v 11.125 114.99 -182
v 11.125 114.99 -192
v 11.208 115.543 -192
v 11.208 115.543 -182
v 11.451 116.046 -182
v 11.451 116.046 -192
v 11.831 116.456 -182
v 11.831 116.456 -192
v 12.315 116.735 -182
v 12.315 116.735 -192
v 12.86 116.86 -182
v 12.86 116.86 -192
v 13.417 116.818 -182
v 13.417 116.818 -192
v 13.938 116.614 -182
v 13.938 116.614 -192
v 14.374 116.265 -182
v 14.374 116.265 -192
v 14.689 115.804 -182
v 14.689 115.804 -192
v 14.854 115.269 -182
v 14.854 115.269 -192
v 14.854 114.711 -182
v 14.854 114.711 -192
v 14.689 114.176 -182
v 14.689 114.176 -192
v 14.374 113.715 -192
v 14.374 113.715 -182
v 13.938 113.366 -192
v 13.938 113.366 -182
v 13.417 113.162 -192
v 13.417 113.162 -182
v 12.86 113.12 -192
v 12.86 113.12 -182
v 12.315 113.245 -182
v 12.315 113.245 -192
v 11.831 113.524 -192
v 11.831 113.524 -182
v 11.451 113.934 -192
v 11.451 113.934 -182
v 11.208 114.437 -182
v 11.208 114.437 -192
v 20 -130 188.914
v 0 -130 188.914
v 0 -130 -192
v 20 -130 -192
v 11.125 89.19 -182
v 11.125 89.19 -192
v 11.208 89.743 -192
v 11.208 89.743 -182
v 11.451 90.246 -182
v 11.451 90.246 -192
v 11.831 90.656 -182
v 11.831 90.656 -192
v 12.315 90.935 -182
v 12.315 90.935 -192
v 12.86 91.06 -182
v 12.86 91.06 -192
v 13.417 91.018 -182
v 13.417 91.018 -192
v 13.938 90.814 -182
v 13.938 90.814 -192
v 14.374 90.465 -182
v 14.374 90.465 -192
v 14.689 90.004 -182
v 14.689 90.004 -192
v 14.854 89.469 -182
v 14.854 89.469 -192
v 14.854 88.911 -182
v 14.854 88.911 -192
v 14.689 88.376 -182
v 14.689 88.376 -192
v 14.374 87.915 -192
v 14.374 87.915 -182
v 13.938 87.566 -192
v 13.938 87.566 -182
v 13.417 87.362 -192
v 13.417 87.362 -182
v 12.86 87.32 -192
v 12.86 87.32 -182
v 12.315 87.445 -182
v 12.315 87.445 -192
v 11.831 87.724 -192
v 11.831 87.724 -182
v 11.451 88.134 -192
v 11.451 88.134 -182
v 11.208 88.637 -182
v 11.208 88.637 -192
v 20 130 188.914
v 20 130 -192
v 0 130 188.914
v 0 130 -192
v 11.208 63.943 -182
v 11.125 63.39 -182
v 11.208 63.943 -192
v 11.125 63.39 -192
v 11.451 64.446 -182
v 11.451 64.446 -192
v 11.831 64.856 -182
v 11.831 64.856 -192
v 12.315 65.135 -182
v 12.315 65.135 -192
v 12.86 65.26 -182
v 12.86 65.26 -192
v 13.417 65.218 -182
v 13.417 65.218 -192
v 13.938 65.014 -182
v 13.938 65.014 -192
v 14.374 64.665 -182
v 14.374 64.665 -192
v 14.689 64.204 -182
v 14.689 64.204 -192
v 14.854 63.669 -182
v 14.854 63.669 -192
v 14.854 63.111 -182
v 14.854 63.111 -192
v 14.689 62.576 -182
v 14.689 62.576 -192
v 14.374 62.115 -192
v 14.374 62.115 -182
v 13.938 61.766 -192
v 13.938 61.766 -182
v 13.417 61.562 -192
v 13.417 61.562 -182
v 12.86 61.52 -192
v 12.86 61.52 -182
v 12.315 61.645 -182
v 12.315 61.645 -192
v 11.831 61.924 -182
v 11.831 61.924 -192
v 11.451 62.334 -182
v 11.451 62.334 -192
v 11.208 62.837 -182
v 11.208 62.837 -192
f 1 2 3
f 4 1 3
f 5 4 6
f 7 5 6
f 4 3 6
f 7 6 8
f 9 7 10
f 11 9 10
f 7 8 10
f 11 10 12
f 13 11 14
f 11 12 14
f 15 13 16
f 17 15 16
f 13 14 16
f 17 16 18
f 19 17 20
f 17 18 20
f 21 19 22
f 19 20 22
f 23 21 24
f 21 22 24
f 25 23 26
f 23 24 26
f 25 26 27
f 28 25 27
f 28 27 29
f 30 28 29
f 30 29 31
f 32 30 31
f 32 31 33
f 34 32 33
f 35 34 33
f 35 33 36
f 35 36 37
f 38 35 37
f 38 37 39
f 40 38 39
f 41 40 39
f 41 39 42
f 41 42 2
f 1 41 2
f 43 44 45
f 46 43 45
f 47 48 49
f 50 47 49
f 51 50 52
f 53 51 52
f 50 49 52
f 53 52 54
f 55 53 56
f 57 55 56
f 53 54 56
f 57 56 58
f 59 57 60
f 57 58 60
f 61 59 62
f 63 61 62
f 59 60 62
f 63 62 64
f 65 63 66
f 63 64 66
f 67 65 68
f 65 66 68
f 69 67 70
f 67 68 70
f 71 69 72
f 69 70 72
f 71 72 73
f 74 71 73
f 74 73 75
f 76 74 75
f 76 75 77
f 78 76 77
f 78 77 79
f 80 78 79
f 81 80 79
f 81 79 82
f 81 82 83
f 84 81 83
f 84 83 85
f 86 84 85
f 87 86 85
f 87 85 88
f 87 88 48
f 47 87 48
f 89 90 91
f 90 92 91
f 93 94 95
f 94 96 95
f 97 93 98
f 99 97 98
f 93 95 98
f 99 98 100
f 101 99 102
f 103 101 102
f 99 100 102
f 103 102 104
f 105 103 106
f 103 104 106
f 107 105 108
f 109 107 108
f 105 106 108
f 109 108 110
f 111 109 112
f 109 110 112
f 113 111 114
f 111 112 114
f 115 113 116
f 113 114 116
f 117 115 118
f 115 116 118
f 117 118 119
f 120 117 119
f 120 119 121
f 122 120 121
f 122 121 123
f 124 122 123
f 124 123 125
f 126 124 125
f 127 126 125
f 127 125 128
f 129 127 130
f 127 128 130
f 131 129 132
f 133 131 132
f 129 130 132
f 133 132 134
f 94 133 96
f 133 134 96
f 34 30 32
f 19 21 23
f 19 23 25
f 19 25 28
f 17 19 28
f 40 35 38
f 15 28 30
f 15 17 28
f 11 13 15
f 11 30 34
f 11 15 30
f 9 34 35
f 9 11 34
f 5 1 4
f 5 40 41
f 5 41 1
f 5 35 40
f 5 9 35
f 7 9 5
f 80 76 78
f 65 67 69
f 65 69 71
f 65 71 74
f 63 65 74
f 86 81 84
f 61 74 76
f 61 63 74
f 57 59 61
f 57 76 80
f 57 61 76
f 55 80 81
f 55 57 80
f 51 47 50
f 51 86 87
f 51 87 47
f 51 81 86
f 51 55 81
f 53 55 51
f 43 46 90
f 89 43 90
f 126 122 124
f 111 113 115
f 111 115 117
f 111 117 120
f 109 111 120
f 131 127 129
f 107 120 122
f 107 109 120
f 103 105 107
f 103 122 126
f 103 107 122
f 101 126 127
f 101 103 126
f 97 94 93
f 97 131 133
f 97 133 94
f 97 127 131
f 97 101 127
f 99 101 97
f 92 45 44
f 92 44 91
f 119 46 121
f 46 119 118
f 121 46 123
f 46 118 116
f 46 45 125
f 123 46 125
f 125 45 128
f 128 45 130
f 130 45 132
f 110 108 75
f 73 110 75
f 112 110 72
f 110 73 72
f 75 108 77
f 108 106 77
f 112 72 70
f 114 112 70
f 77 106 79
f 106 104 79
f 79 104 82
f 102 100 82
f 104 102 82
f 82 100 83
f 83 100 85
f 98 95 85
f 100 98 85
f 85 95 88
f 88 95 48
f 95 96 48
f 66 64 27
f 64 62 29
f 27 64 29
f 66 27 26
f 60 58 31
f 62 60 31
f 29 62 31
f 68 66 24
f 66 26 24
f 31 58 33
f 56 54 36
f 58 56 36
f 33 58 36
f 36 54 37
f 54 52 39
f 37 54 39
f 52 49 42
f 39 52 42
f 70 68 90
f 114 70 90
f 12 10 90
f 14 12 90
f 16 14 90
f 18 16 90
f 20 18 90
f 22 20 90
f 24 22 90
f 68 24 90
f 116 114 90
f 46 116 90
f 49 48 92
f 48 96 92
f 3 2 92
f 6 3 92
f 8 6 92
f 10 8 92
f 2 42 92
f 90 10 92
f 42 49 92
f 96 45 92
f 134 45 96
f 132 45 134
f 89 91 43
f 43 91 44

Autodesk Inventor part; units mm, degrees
ref_plane "YZ Plane" through (0, 0, 0) normal (1, 0, 0) x (0, 1, 0)
ref_plane "XZ Plane" through (0, 0, 0) normal (0, 1, 0) x (-1, 0, 0)
ref_plane "XY Plane" through (0, 0, 0) normal (0, 0, 1) x (1, 0, 0)
sketch "Sketch1" plane through (0, 0, 0) normal (1, 0, 0) x (0, 1, 0)
  line L0 (-130, 188.914) -> (-130, -192)
  line L1 (-130, -192) -> (130, -192)
  line L2 (130, -192) -> (130, 188.914)
  line L3 (130, 188.914) -> (-130, 188.914)
  line L4 (130, 188.914) -> (390, 188.914) construction
  dimension "d0" = 260
  dimension "d15" = 180
extrude "Extrusion1" add sketch "Sketch1" along normal blind 20
sketch "Sketch2" plane through (0, -130, -192) normal (0, 0, -1) x (-1, 0, 0)
  circle A0 centre (-13, 244.99) radius 1.875
  circle A1 centre (-13, 219.19) radius 1.875
  circle A2 centre (-13, 193.39) radius 1.875
  line L0 (0, 260) -> (-20, 260) projected
  line L1 (0, 0) -> (0, 260) projected
  point P0 (0, 130)
  dimension "d4" = 3.75
  dimension "d5" = 3.75
  dimension "d6" = 3.75
  dimension "d7" = 15.01
  dimension "d8" = 25.8
  dimension "d9" = 25.8
  dimension "d10" = 13
extrude "Extrusion2" cut sketch "Sketch2" against normal blind 10
properties part number "Control Box Cover"
